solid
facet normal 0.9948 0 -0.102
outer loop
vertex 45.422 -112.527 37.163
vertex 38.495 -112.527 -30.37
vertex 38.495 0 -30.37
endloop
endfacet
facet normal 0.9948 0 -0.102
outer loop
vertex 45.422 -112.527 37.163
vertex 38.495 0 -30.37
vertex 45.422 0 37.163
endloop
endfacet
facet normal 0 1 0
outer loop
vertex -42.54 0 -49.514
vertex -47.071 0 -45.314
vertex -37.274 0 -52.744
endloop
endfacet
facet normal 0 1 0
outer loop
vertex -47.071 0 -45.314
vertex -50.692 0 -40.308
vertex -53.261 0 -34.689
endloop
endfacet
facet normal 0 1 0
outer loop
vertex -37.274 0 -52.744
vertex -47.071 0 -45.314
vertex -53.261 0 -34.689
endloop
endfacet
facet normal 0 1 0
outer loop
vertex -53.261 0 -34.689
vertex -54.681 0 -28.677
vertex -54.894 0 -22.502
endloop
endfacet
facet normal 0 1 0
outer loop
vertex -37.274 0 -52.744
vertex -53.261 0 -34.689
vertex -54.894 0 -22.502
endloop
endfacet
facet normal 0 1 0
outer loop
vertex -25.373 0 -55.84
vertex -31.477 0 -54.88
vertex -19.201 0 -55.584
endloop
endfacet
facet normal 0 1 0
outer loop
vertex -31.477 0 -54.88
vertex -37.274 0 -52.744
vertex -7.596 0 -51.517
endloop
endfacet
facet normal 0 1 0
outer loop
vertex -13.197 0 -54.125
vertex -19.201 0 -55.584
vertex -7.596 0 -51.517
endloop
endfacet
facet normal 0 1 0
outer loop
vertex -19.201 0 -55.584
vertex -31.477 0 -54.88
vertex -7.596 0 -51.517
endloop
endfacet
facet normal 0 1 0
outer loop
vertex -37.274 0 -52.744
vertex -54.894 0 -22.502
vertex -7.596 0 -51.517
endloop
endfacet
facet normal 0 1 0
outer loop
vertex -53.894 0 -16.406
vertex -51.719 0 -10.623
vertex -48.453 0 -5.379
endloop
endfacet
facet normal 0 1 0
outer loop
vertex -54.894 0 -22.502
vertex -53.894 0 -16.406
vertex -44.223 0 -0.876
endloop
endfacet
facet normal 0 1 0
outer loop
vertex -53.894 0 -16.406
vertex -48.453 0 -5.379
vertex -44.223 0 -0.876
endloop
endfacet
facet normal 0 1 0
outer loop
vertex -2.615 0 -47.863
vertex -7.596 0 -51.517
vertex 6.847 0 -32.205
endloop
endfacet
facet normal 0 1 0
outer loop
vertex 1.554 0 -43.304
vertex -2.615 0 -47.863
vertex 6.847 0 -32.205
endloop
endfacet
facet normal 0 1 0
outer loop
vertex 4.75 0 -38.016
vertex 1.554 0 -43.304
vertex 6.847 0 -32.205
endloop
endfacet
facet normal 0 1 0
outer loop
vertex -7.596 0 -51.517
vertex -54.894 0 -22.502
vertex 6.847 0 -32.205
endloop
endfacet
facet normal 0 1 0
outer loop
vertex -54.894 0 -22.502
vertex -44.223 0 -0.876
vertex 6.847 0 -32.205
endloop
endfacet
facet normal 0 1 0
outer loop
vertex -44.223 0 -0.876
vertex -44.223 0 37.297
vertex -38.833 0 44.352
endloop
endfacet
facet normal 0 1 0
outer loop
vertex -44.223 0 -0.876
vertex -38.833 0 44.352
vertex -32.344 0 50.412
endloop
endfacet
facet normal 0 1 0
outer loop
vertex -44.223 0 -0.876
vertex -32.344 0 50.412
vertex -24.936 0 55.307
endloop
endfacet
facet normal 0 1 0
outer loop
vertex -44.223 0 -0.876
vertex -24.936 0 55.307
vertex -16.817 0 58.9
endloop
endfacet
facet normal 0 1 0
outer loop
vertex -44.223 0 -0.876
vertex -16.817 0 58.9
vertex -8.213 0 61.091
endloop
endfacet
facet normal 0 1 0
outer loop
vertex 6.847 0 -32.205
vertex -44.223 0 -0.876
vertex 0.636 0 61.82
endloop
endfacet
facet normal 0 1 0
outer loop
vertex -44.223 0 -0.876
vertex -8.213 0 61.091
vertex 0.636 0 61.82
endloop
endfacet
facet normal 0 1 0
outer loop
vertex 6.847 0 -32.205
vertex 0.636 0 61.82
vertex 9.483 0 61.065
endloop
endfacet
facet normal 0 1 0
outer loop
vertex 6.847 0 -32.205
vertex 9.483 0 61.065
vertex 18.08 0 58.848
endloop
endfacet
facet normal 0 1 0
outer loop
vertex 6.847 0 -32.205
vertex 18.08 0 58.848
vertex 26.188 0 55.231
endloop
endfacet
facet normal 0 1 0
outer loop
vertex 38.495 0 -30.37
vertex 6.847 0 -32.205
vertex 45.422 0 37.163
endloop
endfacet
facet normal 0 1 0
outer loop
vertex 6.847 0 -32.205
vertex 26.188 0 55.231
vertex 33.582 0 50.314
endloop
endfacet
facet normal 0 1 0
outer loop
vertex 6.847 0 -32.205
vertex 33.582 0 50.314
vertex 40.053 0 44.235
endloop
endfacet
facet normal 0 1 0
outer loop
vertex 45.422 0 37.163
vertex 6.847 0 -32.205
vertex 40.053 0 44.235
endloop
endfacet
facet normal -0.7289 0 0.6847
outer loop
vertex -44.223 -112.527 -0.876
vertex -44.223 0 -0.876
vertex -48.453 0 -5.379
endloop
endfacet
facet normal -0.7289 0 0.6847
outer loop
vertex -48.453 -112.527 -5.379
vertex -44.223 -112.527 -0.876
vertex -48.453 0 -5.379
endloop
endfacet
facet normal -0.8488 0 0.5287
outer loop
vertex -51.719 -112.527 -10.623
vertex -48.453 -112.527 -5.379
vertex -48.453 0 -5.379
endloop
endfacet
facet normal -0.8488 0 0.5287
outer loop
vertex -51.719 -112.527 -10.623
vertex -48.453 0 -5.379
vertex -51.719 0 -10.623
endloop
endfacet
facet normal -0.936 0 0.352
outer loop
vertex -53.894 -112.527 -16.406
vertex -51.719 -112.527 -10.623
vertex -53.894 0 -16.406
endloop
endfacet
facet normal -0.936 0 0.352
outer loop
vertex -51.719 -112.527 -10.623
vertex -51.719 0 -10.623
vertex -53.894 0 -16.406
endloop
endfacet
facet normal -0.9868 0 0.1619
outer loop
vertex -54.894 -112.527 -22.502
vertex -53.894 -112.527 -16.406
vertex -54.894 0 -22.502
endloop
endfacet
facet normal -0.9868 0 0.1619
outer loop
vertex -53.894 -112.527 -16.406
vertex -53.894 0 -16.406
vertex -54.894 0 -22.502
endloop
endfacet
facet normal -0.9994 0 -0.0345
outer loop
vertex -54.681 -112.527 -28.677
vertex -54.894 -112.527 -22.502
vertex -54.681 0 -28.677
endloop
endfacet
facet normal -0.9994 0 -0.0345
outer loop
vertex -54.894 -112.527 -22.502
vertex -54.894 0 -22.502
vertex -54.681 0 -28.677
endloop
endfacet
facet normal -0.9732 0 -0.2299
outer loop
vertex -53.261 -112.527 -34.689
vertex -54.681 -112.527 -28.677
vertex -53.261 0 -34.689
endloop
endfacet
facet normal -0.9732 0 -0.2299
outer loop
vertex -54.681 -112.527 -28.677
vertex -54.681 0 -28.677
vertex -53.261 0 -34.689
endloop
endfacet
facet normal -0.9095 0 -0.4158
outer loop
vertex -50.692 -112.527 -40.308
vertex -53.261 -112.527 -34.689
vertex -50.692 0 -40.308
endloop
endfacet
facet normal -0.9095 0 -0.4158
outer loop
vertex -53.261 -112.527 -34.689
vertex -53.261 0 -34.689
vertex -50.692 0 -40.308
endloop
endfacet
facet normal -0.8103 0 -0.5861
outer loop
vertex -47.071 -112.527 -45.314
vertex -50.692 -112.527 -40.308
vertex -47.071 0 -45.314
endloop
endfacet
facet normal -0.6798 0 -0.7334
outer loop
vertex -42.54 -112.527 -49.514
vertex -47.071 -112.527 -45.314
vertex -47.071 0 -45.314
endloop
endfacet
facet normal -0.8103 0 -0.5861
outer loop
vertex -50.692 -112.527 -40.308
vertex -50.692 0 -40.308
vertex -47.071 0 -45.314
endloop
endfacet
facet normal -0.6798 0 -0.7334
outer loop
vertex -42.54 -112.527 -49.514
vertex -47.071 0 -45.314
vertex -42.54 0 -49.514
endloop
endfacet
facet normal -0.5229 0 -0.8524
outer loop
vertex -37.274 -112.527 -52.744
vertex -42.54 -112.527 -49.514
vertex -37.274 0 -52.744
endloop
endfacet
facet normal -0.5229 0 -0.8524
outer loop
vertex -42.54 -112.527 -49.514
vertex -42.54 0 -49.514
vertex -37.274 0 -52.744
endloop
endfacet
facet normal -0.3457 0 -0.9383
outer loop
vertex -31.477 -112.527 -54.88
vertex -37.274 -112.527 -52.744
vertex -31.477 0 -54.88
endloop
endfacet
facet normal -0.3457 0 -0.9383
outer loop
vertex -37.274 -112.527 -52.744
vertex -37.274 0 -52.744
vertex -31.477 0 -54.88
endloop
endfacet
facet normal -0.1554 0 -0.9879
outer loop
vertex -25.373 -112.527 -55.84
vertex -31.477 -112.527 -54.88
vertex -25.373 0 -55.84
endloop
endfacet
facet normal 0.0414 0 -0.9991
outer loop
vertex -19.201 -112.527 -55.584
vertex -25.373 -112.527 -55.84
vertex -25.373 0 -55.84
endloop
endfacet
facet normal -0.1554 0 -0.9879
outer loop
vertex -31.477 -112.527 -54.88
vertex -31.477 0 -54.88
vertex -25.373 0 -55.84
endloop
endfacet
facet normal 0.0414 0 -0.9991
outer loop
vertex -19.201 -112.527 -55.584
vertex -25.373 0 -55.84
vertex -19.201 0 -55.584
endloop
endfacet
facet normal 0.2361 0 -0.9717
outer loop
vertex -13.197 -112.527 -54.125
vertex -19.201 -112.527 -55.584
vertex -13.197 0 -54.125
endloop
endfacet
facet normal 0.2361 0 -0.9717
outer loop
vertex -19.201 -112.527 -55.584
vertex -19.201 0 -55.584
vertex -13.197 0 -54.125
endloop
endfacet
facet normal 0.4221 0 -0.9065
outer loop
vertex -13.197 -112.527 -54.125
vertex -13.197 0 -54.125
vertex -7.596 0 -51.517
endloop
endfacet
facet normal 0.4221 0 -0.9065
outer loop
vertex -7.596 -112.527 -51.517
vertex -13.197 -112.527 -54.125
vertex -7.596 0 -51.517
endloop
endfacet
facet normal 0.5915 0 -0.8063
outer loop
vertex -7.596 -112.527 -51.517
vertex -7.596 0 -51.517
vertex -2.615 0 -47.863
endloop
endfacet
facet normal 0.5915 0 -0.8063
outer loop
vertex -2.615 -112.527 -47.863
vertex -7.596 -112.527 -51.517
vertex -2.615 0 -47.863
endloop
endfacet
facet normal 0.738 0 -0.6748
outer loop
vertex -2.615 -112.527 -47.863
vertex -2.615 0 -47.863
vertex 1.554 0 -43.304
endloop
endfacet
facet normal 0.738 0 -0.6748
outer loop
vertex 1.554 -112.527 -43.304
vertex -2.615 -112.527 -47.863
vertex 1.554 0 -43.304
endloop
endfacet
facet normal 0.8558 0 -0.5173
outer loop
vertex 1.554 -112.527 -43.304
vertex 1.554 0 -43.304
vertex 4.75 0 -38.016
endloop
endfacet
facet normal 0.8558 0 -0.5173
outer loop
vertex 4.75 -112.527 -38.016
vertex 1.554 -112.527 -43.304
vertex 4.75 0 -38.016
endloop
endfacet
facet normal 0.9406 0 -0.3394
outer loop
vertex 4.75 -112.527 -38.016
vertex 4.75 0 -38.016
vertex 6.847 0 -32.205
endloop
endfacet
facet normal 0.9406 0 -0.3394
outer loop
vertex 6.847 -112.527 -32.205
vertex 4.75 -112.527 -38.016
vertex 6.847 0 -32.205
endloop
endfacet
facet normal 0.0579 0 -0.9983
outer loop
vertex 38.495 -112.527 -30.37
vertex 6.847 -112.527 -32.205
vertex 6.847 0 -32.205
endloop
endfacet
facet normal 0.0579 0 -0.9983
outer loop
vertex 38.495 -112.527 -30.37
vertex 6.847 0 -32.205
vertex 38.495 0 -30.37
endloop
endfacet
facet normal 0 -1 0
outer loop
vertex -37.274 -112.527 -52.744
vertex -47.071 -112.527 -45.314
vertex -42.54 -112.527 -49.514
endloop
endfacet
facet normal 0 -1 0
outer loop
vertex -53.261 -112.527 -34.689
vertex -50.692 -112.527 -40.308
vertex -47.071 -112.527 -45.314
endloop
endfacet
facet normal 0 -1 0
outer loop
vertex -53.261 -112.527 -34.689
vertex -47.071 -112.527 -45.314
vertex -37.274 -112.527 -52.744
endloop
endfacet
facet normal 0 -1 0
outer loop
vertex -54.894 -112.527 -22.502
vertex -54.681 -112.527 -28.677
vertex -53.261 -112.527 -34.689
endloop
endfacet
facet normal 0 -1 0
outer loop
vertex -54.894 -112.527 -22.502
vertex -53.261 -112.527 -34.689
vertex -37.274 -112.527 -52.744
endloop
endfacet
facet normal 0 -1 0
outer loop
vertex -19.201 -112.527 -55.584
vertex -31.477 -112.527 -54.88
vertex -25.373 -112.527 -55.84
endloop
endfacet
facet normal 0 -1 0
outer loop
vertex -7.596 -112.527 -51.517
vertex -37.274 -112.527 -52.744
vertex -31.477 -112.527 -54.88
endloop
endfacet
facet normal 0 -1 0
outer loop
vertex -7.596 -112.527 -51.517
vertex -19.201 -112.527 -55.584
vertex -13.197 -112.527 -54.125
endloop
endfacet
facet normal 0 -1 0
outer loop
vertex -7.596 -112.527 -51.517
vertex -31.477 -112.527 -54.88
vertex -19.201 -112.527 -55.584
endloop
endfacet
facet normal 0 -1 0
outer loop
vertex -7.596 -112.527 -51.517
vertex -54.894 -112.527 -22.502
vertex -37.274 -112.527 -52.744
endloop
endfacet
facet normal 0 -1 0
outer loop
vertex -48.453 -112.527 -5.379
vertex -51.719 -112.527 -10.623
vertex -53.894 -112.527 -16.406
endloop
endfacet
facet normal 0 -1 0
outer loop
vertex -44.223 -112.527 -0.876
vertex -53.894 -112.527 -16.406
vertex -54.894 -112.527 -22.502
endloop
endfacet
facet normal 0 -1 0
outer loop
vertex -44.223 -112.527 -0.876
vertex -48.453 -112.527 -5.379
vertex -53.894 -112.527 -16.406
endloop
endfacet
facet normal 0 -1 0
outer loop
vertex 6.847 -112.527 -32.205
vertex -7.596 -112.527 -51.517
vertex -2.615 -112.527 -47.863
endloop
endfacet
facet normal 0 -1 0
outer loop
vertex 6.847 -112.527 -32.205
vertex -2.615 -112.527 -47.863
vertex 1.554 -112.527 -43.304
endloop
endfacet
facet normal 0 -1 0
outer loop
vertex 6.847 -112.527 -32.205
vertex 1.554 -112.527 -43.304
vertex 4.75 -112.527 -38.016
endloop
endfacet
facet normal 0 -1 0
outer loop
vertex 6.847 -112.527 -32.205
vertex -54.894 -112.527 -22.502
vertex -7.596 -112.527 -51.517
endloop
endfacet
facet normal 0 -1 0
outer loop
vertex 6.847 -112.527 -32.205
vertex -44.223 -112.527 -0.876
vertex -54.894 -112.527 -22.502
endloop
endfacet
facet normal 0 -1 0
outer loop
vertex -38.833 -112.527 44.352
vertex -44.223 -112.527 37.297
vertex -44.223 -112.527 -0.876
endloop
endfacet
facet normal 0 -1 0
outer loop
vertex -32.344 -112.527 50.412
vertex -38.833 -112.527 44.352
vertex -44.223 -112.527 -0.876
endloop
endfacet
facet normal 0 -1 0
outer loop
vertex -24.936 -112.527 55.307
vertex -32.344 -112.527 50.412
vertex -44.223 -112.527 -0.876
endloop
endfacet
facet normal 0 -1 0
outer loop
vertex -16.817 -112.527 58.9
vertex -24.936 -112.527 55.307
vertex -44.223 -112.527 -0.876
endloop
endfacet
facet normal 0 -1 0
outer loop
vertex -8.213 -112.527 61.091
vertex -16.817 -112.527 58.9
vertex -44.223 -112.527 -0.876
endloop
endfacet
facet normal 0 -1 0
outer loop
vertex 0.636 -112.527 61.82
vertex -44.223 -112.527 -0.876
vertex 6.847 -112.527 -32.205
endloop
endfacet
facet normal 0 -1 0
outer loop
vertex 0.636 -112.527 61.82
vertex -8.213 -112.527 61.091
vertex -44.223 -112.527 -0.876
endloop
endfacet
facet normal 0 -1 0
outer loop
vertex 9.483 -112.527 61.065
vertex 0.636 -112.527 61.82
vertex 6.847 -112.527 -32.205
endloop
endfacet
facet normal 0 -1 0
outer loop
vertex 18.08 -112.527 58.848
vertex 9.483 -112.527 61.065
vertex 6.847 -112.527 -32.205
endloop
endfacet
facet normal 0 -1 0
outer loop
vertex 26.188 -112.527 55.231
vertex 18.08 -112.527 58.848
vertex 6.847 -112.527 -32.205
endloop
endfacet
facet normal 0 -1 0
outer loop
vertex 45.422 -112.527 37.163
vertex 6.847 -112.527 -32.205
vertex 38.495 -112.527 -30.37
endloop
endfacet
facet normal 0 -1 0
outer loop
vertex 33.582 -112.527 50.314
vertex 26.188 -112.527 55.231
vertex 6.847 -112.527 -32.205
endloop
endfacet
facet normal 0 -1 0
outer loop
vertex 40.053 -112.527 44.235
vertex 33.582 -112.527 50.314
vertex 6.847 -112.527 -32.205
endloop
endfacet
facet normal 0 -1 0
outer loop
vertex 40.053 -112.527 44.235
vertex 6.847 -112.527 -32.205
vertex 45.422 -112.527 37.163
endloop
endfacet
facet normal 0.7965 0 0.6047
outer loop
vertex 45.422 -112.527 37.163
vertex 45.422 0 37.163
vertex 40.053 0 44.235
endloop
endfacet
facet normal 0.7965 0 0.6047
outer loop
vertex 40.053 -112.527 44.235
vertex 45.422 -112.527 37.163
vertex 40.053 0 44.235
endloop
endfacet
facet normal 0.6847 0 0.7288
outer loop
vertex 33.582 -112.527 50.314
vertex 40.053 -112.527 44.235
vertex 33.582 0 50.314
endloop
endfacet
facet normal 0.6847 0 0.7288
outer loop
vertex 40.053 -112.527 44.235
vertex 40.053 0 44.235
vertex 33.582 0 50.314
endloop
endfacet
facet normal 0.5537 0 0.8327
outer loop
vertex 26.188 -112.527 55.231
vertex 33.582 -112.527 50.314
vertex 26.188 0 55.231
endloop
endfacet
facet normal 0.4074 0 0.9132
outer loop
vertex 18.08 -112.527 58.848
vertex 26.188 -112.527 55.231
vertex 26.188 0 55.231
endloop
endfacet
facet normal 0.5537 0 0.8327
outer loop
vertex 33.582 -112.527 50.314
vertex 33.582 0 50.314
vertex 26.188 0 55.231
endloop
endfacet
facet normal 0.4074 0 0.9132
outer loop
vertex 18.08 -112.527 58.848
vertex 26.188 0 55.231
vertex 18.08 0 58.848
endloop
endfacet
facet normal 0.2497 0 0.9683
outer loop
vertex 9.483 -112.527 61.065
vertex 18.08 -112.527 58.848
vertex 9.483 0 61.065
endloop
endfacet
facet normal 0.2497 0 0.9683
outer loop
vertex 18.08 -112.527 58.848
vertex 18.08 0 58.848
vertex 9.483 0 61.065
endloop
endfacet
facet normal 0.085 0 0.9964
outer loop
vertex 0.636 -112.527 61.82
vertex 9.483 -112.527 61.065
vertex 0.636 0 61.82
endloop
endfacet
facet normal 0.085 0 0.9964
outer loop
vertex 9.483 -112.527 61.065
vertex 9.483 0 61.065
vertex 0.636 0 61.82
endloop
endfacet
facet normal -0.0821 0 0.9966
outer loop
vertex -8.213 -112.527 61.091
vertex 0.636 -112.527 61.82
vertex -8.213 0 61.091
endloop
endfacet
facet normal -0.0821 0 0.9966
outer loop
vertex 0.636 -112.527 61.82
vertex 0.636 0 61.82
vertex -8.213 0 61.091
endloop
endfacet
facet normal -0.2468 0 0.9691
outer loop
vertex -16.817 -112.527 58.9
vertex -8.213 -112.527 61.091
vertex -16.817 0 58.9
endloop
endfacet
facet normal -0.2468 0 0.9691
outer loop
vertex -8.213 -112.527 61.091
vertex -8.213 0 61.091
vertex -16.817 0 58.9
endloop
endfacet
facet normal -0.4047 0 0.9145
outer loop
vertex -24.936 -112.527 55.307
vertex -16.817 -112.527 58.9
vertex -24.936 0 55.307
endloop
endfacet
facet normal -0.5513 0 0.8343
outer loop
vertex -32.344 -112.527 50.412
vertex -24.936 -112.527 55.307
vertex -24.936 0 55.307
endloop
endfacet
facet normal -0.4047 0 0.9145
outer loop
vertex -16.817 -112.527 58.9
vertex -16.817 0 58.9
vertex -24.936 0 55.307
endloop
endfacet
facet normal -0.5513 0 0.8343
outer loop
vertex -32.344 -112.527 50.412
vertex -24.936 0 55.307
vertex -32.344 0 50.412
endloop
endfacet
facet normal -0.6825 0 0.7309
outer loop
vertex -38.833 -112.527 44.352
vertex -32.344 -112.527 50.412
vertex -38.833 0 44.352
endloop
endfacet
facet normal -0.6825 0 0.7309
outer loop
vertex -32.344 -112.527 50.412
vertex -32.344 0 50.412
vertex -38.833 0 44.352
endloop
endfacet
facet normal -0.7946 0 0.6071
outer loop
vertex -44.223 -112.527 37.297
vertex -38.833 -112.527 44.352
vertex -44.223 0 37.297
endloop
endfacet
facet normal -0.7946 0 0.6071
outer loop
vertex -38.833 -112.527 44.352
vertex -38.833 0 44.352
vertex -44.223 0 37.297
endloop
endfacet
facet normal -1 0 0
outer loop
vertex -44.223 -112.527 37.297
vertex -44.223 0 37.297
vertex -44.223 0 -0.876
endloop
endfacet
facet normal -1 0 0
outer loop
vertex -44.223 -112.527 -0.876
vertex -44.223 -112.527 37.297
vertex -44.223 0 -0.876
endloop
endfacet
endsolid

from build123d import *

# Parameters (mm, degrees)
F1_DEPTH = 112.526558


with BuildPart() as f1:
    # F0 (on Front) → F1 (new body)
    with BuildSketch(Plane.XZ):
        with BuildLine():
            Line((38.495421, -30.370116), (45.421928, 37.163377))
            ThreePointArc((45.421928, 37.163377), (0.635948, 61.819784), (-44.223107, 37.296578))
            Line((-44.223107, 37.296578), (-44.223107, -0.875685))
            ThreePointArc((-44.223107, -0.875685), (-10.598014, 4.062906), (7.804978, -24.509221))
            ThreePointArc((7.804978, -24.509221), (7.564505, -28.386732), (6.846773, -32.204817))
            Line((6.846773, -32.204817), (38.495421, -30.370116))
        make_face()
        with BuildLine():
            ThreePointArc((7.804978, -24.509221), (-10.598014, 4.062906), (-44.223107, -0.875685))
            Line((-44.223107, -0.875685), (-44.223107, -35.165384))
            Line((-44.223107, -35.165384), (6.846773, -32.204817))
            ThreePointArc((6.846773, -32.204817), (7.564505, -28.386732), (7.804978, -24.509221))
        make_face()
        with BuildLine():
            Line((-44.223107, -35.165384), (-44.223107, -0.875685))
            ThreePointArc((-44.223107, -0.875685), (-39.986448, -51.258757), (6.846773, -32.204817))
            Line((6.846773, -32.204817), (-44.223107, -35.165384))
        make_face()
    extrude(amount=F1_DEPTH)


solid = f1.part
